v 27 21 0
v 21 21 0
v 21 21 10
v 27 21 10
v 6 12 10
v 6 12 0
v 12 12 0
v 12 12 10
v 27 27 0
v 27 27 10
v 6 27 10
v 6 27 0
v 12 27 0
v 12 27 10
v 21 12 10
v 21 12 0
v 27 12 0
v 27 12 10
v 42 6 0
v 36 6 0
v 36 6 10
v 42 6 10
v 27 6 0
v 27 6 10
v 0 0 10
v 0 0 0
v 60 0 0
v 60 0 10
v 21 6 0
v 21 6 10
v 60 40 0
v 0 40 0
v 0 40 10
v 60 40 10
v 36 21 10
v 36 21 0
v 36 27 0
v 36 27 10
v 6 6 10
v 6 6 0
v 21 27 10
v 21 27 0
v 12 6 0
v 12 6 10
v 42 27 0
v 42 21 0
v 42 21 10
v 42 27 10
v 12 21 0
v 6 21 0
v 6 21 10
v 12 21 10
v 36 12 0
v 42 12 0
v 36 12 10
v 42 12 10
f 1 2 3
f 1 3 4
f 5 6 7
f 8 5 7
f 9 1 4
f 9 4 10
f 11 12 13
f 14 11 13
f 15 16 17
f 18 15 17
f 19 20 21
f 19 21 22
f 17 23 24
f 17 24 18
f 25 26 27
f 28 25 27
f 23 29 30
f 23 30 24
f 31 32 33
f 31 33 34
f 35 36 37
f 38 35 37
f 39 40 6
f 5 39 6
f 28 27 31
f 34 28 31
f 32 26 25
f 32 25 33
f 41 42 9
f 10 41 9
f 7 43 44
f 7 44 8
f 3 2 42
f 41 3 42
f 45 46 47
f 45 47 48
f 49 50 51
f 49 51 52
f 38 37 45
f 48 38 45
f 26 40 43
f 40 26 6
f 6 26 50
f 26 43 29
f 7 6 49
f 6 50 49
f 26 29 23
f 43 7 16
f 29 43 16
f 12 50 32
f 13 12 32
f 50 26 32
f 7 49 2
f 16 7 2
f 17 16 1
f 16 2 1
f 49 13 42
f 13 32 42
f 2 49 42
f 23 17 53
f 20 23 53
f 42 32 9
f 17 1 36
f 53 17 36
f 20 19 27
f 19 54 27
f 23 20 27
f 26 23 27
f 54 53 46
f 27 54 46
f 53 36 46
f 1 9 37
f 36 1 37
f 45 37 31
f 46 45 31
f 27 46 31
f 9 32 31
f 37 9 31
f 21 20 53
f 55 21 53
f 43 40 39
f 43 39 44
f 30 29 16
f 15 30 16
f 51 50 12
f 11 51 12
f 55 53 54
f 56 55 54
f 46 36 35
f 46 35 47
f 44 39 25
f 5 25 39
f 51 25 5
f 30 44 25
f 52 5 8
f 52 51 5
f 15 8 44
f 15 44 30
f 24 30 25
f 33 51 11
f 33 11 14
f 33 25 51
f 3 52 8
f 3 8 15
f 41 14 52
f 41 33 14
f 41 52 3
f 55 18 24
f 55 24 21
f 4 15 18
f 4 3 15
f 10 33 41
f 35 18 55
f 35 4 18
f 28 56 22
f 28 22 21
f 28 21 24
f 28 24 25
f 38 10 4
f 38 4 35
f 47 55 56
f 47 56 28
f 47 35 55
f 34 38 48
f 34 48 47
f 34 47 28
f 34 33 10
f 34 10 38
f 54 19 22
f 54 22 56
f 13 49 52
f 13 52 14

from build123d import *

# Parameters (mm, degrees)
SKETCH1_W            = 60
SKETCH1_H            = 40
BOSS_EXTRUDE1_DEPTH  = 10
SKETCH2_W            = 6
SKETCH2_H            = 6
CUT_EXTRUDE1_DEPTH   = 73.801098893
LPATTERN1_COUNT      = 3
LPATTERN1_PITCH      = 15
LPATTERN1_COUNT_DIR2 = 2
LPATTERN1_PITCH_DIR2 = 15


with BuildPart() as part:
    # Sketch1 → Boss-Extrude1 (new body)
    with BuildSketch(Plane.XY):
        with Locations((30, 20)):
            Rectangle(SKETCH1_W, SKETCH1_H)
    extrude(amount=BOSS_EXTRUDE1_DEPTH)

    # Sketch2 → Cut-Extrude1 (cut, through all)
    with BuildSketch(Plane.XY):
        with Locations((9, 9)):
            Rectangle(SKETCH2_W, SKETCH2_H)
    cut_extrude1 = extrude(amount=CUT_EXTRUDE1_DEPTH, mode=Mode.SUBTRACT)

    # LPattern1: Cut-Extrude1 3 × 2
    with Locations(*[(i * LPATTERN1_PITCH, j * LPATTERN1_PITCH_DIR2, 0) for i in range(LPATTERN1_COUNT) for j in range(LPATTERN1_COUNT_DIR2) if (i, j) != (0, 0)]):
        add(cut_extrude1, mode=Mode.SUBTRACT)


solid = part.part
